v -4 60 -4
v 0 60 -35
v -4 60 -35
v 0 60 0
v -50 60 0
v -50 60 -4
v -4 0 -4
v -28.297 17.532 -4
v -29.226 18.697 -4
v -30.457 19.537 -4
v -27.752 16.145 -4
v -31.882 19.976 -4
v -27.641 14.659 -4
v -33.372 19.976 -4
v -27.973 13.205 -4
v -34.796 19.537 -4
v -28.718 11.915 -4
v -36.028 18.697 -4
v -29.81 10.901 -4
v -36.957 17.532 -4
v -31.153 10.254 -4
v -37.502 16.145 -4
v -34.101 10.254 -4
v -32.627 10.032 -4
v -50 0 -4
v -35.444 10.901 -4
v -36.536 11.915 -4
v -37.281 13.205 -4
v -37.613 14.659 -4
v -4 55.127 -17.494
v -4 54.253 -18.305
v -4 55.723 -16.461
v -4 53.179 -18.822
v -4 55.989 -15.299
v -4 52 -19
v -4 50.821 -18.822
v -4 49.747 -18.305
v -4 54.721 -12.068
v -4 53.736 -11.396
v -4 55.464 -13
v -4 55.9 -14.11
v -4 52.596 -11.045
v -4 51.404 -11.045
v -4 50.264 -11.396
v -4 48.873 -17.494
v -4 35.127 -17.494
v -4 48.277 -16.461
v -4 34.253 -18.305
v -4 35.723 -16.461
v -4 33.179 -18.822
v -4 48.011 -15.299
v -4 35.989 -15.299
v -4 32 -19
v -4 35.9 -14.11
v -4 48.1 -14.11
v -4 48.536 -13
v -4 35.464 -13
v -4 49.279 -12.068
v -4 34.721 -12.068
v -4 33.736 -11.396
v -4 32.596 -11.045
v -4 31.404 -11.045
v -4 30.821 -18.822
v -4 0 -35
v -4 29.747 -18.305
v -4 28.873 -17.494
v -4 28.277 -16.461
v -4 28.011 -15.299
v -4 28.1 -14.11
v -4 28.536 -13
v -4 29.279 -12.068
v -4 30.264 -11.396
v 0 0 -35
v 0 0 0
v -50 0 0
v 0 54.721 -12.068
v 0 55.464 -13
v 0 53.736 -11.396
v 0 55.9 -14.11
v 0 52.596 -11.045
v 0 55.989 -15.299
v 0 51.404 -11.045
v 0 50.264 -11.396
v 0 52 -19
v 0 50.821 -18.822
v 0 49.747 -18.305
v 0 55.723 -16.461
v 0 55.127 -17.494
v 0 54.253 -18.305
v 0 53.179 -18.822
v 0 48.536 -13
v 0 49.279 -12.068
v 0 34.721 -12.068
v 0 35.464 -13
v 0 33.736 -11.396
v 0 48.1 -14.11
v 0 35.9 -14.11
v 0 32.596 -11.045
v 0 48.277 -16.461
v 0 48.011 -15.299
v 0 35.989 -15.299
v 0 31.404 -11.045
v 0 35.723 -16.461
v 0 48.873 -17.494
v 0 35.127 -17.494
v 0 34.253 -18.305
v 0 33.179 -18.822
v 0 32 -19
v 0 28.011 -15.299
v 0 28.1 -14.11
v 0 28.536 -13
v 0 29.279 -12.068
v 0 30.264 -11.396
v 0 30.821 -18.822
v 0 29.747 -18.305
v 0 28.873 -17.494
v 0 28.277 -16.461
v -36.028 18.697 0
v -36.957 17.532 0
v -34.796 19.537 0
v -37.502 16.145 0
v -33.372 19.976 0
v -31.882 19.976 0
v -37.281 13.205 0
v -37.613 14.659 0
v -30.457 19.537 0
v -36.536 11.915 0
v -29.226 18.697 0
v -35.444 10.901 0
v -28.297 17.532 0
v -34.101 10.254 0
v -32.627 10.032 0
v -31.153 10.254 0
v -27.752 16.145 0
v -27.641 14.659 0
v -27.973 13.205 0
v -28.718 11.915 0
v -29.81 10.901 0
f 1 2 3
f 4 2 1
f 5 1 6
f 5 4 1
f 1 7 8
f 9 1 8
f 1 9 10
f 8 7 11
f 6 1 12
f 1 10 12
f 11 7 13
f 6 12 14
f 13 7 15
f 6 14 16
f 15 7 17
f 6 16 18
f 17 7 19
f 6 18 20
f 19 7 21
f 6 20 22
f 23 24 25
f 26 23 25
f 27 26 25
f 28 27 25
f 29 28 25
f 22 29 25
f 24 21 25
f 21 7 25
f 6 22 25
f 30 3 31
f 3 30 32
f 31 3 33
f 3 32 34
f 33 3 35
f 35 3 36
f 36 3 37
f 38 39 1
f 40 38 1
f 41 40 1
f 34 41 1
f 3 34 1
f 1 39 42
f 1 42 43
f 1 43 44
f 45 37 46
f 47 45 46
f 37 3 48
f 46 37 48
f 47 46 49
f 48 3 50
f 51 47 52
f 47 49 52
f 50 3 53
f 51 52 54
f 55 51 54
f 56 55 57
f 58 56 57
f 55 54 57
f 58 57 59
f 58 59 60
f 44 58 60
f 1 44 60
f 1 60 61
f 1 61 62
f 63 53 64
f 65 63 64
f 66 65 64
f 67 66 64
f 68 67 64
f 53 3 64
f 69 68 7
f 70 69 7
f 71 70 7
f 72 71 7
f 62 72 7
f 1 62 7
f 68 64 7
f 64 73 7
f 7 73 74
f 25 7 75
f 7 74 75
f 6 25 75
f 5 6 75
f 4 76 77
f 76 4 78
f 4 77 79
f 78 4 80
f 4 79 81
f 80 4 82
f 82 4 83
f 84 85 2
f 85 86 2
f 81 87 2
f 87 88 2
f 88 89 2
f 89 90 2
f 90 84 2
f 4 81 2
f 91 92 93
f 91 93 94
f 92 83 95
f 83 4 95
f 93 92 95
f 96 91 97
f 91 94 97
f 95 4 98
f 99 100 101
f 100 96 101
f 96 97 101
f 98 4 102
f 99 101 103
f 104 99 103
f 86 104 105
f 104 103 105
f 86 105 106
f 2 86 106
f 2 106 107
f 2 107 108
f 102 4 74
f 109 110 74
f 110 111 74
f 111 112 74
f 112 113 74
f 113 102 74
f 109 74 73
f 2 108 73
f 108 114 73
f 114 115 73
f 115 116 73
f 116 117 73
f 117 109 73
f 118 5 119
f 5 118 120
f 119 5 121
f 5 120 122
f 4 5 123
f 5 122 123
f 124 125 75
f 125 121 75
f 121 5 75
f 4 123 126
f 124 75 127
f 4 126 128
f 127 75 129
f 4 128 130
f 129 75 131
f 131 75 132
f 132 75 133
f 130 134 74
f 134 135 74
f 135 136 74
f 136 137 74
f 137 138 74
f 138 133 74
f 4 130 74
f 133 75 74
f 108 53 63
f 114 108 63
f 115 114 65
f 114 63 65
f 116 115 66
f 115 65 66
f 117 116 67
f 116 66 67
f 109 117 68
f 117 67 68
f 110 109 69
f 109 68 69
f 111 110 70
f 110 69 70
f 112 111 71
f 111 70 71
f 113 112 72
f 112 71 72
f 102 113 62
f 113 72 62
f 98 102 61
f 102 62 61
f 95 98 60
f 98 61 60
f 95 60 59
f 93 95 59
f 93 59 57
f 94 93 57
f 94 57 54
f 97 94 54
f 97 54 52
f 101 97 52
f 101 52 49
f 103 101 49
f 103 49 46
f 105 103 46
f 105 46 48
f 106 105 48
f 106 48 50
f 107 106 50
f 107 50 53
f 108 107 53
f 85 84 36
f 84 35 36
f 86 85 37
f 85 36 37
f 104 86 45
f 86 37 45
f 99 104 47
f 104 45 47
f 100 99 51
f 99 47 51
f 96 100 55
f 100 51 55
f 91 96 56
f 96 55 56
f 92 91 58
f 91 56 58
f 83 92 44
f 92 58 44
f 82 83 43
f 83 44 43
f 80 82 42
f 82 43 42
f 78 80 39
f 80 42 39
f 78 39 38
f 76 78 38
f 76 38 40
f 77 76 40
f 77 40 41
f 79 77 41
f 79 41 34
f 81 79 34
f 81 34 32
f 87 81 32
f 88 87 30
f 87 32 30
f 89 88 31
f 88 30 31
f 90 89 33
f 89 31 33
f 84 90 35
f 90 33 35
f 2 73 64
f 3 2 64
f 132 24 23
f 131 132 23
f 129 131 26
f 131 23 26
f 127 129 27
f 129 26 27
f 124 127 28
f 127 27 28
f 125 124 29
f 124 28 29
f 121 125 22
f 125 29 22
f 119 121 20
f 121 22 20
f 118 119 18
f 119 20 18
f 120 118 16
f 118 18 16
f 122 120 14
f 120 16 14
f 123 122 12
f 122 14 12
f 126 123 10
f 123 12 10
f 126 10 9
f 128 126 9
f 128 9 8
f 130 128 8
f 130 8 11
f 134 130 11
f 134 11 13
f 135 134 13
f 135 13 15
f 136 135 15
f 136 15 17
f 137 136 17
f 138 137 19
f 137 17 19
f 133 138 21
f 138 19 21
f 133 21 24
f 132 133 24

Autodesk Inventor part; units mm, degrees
ref_plane "YZ Plane" through (0, 0, 0) normal (1, 0, 0) x (0, 1, 0)
ref_plane "XZ Plane" through (0, 0, 0) normal (0, 1, 0) x (-1, 0, 0)
ref_plane "XY Plane" through (0, 0, 0) normal (0, 0, 1) x (1, 0, 0)
sketch "スケッチ1" plane through (0, 0, 0) normal (0, 1, 0) x (-1, 0, 0)
  line L0 (0, 0) -> (0, -35)
  line L1 (0, -35) -> (4, -35)
  line L2 (4, -35) -> (4, -4)
  line L3 (4, -4) -> (50, -4)
  line L4 (50, -4) -> (50, 0)
  line L5 (50, 0) -> (0, 0)
  dimension "d0" = 35
  dimension "d1" = 4
  dimension "d2" = 90
  dimension "d3" = 31
  dimension "d4" = 46
extrude "押し出し1" add sketch "スケッチ1" along normal blind 60
sketch "スケッチ2" plane through (-50, 0, 0) normal (0, 0, 1) x (1, 0, 0)
  line L0 (50, 0) -> (50, 60) projected
  line L1 (0, 0) -> (50, 0) projected
  point P0 (17.3731, 15.0322)
  dimension "d7" = 32.6269
  dimension "d8" = 15.0322
hole "穴1" at (-32.6269, 15.0322, 0) direction (0, 0, -1) diameter 10 end through all
sketch "スケッチ3" plane through (0, 0, 0) normal (1, 0, 0) x (0, 0, -1)
  line L0 (0, 0) -> (35, 0) projected
  line L1 (35, 0) -> (35, 60) projected
  line L2 (0, 0) -> (0, 60) projected
  line L3 (0, 60) -> (35, 60) projected
  point P0 (15, 32)
  point P1 (15, 52)
  dimension "d16" = 32
  dimension "d22" = 8
  dimension "d31" = 15
  dimension "d32" = 15
hole "穴2" at (0, 32, -15) at (0, 52, -15) direction (-1, 0, 0) diameter 8 end through all
properties part number "ブレーキ固定アングル"
